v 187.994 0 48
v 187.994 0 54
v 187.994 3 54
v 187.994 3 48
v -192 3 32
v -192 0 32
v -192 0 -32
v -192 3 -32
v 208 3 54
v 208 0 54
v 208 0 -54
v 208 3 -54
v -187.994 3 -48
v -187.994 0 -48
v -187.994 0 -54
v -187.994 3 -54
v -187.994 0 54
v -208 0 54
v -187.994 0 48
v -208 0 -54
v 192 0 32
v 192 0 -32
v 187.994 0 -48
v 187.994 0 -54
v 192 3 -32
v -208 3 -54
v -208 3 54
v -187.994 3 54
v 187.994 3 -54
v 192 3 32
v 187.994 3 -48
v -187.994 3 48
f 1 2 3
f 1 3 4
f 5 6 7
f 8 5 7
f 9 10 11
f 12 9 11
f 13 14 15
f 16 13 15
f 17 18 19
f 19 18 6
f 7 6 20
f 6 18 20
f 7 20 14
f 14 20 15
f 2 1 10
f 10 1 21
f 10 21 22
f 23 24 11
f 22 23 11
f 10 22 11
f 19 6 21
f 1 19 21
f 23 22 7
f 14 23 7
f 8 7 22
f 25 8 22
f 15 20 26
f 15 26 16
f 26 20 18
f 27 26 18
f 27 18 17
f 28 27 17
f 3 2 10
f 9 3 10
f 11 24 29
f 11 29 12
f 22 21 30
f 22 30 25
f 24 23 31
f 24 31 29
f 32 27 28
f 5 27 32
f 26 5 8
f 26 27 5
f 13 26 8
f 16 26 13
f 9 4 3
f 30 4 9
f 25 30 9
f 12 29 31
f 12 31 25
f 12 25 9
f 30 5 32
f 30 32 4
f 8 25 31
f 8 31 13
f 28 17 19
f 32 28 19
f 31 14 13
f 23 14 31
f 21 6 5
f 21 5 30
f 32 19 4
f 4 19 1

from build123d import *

# Parameters (mm, degrees)
CROQUIS1_W              = 416
CROQUIS1_H              = 96
CROQUIS1_W_2            = 384
CROQUIS1_H_2            = 64
CROQUIS1_W_3            = 20.00615983
CROQUIS1_H_3            = 6
SALIENTE_EXTRUIR1_DEPTH = 3


with BuildPart() as part:
    # Croquis1 → Saliente-Extruir1 (new body)
    with BuildSketch(Plane(origin=(0, 0, 0), x_dir=(1, 0, 0), z_dir=(0, 1, 0))):
        Rectangle(CROQUIS1_W, CROQUIS1_H)
        Rectangle(CROQUIS1_W_2, CROQUIS1_H_2, mode=Mode.SUBTRACT)
        with Locations((197.996920085, -51)):
            Rectangle(CROQUIS1_W_3, CROQUIS1_H_3)
        with Locations((197.996920085, 51)):
            Rectangle(CROQUIS1_W_3, CROQUIS1_H_3)
        with Locations((-197.996920085, 51)):
            Rectangle(CROQUIS1_W_3, CROQUIS1_H_3)
        with Locations((-197.996920085, -51)):
            Rectangle(CROQUIS1_W_3, CROQUIS1_H_3)
    extrude(amount=SALIENTE_EXTRUIR1_DEPTH)


solid = part.part
